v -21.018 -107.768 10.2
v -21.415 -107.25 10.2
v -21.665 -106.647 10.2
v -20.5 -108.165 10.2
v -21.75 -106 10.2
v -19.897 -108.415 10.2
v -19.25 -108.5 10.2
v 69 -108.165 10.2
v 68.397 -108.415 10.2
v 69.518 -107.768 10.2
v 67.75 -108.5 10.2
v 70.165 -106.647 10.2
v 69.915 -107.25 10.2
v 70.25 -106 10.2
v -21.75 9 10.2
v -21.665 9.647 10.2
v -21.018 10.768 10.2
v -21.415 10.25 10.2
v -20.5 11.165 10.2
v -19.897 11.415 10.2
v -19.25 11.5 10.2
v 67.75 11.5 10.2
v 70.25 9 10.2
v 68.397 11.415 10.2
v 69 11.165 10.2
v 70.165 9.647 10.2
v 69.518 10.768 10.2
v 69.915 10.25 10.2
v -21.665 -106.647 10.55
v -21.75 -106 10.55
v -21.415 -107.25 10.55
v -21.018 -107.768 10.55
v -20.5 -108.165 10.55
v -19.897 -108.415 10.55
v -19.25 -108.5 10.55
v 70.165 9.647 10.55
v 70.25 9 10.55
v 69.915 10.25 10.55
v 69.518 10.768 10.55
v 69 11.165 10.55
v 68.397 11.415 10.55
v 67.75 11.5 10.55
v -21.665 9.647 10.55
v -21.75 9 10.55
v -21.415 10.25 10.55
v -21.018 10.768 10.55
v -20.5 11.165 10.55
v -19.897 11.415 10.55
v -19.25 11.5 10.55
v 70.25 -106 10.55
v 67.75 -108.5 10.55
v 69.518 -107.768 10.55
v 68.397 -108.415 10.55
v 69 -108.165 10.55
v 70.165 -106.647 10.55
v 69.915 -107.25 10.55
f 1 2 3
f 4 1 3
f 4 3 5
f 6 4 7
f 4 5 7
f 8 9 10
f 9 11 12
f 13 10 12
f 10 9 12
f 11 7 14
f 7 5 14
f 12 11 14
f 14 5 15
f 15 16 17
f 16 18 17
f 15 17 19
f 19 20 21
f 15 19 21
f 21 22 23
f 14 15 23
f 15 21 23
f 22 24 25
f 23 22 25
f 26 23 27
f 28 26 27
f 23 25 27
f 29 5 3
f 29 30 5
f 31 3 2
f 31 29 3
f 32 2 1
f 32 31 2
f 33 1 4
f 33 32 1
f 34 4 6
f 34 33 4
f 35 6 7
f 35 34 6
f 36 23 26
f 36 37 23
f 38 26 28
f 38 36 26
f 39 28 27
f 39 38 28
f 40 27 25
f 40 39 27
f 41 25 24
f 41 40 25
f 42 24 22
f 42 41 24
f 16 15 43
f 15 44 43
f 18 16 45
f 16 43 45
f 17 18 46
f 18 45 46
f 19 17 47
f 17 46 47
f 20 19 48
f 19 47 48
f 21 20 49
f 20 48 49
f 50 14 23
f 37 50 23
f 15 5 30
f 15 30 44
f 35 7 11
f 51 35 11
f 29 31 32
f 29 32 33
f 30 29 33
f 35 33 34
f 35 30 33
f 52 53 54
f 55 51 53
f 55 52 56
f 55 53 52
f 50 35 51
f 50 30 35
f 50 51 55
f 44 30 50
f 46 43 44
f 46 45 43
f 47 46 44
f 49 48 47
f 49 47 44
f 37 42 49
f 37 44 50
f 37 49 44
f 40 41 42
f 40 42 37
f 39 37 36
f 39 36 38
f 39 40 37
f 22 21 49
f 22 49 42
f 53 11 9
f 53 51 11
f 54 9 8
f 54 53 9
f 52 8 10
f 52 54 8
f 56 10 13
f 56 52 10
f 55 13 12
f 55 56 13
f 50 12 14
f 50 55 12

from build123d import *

# Parameters (mm, degrees)
BOX003_W     = 92
BOX003_H     = 120
BOX003_DEPTH = 0.35
FILLET004_R  = 2.5
FILLET005_R  = 2.5
FILLET006_R  = 2.5
FILLET007_R  = 2.5


with BuildPart() as part:
    # Box003 → Box003 (new body)
    with BuildSketch(Plane(origin=(-21.75, -108.5, 10.2), x_dir=(1, 0, 0), z_dir=(0, 0, 1))):
        with Locations((46, 60)):
            Rectangle(BOX003_W, BOX003_H)
    extrude(amount=BOX003_DEPTH)

    # Fillet004
    fillet004_edges = [part.edges().sort_by_distance(p)[0] for p in [
        (-21.75, 11.5, 10.375),
    ]]
    fillet(fillet004_edges, radius=FILLET004_R)

    # Fillet005
    fillet005_edges = [part.edges().sort_by_distance(p)[0] for p in [
        (-21.75, -108.5, 10.375),
    ]]
    fillet(fillet005_edges, radius=FILLET005_R)

    # Fillet006
    fillet006_edges = [part.edges().sort_by_distance(p)[0] for p in [
        (70.25, -108.5, 10.375),
    ]]
    fillet(fillet006_edges, radius=FILLET006_R)

    # Fillet007
    fillet007_edges = [part.edges().sort_by_distance(p)[0] for p in [
        (70.25, 11.5, 10.375),
    ]]
    fillet(fillet007_edges, radius=FILLET007_R)


solid = part.part
